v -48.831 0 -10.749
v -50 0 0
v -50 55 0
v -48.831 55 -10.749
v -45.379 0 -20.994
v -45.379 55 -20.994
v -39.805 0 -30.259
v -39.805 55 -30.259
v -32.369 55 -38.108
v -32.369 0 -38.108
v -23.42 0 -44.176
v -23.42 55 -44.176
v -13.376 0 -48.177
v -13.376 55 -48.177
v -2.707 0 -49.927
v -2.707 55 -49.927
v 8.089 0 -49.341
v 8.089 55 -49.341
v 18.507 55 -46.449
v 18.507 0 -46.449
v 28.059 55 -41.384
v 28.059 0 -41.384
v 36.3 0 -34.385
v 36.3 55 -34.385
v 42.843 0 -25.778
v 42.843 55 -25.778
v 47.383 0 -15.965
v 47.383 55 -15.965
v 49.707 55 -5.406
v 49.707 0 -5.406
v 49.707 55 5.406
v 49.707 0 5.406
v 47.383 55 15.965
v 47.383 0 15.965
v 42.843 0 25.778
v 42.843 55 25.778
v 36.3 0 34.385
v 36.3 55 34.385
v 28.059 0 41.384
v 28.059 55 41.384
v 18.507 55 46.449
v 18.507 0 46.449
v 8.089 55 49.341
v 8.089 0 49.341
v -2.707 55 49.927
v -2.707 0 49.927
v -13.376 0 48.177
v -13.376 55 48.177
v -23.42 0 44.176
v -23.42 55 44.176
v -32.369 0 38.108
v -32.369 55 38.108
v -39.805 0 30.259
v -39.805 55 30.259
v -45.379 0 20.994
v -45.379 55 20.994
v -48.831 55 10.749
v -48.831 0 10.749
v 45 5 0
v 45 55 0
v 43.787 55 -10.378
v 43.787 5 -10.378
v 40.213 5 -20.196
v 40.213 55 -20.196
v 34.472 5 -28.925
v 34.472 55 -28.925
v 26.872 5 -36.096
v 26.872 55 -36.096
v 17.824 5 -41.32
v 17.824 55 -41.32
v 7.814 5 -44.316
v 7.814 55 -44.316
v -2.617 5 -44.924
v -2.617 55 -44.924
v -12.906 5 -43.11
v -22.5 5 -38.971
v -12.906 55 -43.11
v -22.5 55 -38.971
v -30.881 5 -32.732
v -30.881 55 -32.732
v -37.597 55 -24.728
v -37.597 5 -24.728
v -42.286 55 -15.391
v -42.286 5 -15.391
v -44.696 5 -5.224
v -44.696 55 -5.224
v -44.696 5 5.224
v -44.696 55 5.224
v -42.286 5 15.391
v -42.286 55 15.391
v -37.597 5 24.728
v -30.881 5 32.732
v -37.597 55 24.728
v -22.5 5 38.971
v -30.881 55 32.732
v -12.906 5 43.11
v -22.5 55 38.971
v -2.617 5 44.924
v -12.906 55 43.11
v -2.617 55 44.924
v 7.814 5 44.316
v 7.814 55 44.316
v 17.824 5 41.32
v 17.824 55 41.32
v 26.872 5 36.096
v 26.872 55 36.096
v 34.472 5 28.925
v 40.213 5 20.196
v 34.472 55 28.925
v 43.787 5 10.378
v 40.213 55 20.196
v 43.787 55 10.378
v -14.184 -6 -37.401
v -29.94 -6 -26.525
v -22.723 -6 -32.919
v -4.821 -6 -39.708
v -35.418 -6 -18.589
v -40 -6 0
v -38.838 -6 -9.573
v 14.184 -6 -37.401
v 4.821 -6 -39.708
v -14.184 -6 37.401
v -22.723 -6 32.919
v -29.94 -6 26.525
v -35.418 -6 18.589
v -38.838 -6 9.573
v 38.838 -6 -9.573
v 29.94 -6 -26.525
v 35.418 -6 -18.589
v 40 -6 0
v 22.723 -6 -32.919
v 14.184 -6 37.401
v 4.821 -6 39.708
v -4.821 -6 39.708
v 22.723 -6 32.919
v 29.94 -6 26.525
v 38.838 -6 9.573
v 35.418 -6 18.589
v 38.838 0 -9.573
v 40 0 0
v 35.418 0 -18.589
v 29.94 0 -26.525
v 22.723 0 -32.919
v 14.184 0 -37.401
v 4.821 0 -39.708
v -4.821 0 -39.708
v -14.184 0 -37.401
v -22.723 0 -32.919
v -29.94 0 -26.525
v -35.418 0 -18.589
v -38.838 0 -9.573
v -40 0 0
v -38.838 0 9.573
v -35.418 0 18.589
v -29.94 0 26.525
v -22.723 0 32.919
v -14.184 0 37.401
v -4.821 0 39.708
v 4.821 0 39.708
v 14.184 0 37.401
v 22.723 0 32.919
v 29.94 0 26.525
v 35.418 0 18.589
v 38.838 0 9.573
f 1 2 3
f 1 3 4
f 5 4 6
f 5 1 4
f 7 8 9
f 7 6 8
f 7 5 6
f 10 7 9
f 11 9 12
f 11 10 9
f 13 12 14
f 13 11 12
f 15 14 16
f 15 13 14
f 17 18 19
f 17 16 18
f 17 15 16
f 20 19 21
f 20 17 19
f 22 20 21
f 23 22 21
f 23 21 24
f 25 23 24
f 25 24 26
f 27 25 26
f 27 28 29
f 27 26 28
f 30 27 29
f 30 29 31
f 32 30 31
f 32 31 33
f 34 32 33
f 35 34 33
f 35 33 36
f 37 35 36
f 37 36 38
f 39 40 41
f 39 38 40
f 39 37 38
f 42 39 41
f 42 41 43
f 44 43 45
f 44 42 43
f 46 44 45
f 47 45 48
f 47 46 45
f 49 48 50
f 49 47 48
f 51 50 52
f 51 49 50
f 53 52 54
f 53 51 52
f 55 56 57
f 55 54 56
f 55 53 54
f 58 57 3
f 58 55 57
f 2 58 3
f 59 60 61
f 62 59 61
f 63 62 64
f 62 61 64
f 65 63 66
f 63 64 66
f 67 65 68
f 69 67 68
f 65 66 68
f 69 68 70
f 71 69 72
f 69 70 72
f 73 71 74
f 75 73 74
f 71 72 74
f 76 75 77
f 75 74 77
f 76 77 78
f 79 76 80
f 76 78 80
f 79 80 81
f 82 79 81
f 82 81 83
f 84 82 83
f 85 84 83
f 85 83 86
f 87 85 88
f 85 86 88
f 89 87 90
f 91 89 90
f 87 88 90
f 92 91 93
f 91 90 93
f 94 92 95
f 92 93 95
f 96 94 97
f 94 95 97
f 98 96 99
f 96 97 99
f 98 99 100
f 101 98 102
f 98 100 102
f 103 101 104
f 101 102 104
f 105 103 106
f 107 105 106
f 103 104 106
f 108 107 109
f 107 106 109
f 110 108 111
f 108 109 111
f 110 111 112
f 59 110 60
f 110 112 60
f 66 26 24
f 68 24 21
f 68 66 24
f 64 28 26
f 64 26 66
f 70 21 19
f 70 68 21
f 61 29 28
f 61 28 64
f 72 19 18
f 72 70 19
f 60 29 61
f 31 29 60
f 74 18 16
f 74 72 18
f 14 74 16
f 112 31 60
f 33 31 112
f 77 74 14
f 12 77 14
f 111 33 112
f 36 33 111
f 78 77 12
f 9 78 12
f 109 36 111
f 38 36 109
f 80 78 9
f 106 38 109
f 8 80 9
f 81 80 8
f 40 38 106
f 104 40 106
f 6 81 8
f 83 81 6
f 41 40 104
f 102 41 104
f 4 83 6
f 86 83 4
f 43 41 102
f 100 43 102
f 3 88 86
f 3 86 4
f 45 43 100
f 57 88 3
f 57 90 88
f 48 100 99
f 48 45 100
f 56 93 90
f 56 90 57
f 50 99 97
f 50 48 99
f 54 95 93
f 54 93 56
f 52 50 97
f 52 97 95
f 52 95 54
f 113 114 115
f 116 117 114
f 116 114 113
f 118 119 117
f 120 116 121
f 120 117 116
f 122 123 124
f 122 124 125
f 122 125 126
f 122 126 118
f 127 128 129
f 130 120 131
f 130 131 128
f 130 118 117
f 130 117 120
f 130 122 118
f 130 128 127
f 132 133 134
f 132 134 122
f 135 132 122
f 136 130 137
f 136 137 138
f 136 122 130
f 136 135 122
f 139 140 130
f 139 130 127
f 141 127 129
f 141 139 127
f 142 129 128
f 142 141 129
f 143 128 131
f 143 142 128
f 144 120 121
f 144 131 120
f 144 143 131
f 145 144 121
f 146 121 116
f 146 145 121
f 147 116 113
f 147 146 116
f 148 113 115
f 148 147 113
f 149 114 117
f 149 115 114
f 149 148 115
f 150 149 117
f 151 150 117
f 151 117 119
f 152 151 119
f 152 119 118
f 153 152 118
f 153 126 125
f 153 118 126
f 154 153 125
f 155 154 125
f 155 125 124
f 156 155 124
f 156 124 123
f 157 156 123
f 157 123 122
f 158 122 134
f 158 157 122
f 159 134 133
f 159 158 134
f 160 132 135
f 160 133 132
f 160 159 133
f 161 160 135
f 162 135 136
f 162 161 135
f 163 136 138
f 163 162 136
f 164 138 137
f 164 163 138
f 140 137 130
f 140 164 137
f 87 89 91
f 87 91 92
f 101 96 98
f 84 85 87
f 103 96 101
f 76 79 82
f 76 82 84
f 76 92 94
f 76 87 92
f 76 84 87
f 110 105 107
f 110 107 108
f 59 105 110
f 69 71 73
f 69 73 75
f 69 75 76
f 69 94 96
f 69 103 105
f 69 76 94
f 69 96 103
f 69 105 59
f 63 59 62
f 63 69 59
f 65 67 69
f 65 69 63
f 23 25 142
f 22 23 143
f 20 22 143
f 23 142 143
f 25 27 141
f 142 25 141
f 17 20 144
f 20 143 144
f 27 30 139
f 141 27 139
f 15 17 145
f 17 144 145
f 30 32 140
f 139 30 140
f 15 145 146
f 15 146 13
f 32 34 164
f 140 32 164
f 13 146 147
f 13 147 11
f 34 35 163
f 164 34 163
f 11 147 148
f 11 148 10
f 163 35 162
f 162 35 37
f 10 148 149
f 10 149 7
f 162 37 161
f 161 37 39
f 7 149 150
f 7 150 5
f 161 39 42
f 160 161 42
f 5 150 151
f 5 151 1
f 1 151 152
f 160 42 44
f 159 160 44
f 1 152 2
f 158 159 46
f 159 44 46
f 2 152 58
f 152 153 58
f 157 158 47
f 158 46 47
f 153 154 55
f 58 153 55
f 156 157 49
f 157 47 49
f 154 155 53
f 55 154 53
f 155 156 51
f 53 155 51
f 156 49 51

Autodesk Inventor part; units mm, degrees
ref_plane "YZ Plane" through (0, 0, 0) normal (1, 0, 0) x (0, 1, 0)
ref_plane "XZ Plane" through (0, 0, 0) normal (0, 1, 0) x (-1, 0, 0)
ref_plane "XY Plane" through (0, 0, 0) normal (0, 0, 1) x (1, 0, 0)
sketch "Boceto1" plane through (0, 0, 0) normal (0, 1, 0) x (-1, 0, 0)
  circle A0 centre (0, 0) radius 50
  dimension "d0" = 100
extrude "Extrusión1" add sketch "Boceto1" along normal blind 55
sketch "Boceto2" plane through (0, 55, 0) normal (0, 1, 0) x (1, 0, 0)
  circle A0 centre (0, 0) radius 45
  dimension "d3" = 90
extrude "Extrusión2" cut sketch "Boceto2" against normal blind 50
thread "Rosca1" size "M80x1.5" class "6H" standard "ANSI Metric M Profile" length 6
sketch "Boceto3" plane through (0, 0, 0) normal (0, -1, 0) x (1, 0, 0)
  circle A0 centre (0, 0) radius 40
  dimension "d8" = 80
extrude "Extrusión3" add sketch "Boceto3" along normal blind 6
thread "Rosca2" size "M80x1.5" class "6g" standard "ANSI Metric M Profile" length 6
